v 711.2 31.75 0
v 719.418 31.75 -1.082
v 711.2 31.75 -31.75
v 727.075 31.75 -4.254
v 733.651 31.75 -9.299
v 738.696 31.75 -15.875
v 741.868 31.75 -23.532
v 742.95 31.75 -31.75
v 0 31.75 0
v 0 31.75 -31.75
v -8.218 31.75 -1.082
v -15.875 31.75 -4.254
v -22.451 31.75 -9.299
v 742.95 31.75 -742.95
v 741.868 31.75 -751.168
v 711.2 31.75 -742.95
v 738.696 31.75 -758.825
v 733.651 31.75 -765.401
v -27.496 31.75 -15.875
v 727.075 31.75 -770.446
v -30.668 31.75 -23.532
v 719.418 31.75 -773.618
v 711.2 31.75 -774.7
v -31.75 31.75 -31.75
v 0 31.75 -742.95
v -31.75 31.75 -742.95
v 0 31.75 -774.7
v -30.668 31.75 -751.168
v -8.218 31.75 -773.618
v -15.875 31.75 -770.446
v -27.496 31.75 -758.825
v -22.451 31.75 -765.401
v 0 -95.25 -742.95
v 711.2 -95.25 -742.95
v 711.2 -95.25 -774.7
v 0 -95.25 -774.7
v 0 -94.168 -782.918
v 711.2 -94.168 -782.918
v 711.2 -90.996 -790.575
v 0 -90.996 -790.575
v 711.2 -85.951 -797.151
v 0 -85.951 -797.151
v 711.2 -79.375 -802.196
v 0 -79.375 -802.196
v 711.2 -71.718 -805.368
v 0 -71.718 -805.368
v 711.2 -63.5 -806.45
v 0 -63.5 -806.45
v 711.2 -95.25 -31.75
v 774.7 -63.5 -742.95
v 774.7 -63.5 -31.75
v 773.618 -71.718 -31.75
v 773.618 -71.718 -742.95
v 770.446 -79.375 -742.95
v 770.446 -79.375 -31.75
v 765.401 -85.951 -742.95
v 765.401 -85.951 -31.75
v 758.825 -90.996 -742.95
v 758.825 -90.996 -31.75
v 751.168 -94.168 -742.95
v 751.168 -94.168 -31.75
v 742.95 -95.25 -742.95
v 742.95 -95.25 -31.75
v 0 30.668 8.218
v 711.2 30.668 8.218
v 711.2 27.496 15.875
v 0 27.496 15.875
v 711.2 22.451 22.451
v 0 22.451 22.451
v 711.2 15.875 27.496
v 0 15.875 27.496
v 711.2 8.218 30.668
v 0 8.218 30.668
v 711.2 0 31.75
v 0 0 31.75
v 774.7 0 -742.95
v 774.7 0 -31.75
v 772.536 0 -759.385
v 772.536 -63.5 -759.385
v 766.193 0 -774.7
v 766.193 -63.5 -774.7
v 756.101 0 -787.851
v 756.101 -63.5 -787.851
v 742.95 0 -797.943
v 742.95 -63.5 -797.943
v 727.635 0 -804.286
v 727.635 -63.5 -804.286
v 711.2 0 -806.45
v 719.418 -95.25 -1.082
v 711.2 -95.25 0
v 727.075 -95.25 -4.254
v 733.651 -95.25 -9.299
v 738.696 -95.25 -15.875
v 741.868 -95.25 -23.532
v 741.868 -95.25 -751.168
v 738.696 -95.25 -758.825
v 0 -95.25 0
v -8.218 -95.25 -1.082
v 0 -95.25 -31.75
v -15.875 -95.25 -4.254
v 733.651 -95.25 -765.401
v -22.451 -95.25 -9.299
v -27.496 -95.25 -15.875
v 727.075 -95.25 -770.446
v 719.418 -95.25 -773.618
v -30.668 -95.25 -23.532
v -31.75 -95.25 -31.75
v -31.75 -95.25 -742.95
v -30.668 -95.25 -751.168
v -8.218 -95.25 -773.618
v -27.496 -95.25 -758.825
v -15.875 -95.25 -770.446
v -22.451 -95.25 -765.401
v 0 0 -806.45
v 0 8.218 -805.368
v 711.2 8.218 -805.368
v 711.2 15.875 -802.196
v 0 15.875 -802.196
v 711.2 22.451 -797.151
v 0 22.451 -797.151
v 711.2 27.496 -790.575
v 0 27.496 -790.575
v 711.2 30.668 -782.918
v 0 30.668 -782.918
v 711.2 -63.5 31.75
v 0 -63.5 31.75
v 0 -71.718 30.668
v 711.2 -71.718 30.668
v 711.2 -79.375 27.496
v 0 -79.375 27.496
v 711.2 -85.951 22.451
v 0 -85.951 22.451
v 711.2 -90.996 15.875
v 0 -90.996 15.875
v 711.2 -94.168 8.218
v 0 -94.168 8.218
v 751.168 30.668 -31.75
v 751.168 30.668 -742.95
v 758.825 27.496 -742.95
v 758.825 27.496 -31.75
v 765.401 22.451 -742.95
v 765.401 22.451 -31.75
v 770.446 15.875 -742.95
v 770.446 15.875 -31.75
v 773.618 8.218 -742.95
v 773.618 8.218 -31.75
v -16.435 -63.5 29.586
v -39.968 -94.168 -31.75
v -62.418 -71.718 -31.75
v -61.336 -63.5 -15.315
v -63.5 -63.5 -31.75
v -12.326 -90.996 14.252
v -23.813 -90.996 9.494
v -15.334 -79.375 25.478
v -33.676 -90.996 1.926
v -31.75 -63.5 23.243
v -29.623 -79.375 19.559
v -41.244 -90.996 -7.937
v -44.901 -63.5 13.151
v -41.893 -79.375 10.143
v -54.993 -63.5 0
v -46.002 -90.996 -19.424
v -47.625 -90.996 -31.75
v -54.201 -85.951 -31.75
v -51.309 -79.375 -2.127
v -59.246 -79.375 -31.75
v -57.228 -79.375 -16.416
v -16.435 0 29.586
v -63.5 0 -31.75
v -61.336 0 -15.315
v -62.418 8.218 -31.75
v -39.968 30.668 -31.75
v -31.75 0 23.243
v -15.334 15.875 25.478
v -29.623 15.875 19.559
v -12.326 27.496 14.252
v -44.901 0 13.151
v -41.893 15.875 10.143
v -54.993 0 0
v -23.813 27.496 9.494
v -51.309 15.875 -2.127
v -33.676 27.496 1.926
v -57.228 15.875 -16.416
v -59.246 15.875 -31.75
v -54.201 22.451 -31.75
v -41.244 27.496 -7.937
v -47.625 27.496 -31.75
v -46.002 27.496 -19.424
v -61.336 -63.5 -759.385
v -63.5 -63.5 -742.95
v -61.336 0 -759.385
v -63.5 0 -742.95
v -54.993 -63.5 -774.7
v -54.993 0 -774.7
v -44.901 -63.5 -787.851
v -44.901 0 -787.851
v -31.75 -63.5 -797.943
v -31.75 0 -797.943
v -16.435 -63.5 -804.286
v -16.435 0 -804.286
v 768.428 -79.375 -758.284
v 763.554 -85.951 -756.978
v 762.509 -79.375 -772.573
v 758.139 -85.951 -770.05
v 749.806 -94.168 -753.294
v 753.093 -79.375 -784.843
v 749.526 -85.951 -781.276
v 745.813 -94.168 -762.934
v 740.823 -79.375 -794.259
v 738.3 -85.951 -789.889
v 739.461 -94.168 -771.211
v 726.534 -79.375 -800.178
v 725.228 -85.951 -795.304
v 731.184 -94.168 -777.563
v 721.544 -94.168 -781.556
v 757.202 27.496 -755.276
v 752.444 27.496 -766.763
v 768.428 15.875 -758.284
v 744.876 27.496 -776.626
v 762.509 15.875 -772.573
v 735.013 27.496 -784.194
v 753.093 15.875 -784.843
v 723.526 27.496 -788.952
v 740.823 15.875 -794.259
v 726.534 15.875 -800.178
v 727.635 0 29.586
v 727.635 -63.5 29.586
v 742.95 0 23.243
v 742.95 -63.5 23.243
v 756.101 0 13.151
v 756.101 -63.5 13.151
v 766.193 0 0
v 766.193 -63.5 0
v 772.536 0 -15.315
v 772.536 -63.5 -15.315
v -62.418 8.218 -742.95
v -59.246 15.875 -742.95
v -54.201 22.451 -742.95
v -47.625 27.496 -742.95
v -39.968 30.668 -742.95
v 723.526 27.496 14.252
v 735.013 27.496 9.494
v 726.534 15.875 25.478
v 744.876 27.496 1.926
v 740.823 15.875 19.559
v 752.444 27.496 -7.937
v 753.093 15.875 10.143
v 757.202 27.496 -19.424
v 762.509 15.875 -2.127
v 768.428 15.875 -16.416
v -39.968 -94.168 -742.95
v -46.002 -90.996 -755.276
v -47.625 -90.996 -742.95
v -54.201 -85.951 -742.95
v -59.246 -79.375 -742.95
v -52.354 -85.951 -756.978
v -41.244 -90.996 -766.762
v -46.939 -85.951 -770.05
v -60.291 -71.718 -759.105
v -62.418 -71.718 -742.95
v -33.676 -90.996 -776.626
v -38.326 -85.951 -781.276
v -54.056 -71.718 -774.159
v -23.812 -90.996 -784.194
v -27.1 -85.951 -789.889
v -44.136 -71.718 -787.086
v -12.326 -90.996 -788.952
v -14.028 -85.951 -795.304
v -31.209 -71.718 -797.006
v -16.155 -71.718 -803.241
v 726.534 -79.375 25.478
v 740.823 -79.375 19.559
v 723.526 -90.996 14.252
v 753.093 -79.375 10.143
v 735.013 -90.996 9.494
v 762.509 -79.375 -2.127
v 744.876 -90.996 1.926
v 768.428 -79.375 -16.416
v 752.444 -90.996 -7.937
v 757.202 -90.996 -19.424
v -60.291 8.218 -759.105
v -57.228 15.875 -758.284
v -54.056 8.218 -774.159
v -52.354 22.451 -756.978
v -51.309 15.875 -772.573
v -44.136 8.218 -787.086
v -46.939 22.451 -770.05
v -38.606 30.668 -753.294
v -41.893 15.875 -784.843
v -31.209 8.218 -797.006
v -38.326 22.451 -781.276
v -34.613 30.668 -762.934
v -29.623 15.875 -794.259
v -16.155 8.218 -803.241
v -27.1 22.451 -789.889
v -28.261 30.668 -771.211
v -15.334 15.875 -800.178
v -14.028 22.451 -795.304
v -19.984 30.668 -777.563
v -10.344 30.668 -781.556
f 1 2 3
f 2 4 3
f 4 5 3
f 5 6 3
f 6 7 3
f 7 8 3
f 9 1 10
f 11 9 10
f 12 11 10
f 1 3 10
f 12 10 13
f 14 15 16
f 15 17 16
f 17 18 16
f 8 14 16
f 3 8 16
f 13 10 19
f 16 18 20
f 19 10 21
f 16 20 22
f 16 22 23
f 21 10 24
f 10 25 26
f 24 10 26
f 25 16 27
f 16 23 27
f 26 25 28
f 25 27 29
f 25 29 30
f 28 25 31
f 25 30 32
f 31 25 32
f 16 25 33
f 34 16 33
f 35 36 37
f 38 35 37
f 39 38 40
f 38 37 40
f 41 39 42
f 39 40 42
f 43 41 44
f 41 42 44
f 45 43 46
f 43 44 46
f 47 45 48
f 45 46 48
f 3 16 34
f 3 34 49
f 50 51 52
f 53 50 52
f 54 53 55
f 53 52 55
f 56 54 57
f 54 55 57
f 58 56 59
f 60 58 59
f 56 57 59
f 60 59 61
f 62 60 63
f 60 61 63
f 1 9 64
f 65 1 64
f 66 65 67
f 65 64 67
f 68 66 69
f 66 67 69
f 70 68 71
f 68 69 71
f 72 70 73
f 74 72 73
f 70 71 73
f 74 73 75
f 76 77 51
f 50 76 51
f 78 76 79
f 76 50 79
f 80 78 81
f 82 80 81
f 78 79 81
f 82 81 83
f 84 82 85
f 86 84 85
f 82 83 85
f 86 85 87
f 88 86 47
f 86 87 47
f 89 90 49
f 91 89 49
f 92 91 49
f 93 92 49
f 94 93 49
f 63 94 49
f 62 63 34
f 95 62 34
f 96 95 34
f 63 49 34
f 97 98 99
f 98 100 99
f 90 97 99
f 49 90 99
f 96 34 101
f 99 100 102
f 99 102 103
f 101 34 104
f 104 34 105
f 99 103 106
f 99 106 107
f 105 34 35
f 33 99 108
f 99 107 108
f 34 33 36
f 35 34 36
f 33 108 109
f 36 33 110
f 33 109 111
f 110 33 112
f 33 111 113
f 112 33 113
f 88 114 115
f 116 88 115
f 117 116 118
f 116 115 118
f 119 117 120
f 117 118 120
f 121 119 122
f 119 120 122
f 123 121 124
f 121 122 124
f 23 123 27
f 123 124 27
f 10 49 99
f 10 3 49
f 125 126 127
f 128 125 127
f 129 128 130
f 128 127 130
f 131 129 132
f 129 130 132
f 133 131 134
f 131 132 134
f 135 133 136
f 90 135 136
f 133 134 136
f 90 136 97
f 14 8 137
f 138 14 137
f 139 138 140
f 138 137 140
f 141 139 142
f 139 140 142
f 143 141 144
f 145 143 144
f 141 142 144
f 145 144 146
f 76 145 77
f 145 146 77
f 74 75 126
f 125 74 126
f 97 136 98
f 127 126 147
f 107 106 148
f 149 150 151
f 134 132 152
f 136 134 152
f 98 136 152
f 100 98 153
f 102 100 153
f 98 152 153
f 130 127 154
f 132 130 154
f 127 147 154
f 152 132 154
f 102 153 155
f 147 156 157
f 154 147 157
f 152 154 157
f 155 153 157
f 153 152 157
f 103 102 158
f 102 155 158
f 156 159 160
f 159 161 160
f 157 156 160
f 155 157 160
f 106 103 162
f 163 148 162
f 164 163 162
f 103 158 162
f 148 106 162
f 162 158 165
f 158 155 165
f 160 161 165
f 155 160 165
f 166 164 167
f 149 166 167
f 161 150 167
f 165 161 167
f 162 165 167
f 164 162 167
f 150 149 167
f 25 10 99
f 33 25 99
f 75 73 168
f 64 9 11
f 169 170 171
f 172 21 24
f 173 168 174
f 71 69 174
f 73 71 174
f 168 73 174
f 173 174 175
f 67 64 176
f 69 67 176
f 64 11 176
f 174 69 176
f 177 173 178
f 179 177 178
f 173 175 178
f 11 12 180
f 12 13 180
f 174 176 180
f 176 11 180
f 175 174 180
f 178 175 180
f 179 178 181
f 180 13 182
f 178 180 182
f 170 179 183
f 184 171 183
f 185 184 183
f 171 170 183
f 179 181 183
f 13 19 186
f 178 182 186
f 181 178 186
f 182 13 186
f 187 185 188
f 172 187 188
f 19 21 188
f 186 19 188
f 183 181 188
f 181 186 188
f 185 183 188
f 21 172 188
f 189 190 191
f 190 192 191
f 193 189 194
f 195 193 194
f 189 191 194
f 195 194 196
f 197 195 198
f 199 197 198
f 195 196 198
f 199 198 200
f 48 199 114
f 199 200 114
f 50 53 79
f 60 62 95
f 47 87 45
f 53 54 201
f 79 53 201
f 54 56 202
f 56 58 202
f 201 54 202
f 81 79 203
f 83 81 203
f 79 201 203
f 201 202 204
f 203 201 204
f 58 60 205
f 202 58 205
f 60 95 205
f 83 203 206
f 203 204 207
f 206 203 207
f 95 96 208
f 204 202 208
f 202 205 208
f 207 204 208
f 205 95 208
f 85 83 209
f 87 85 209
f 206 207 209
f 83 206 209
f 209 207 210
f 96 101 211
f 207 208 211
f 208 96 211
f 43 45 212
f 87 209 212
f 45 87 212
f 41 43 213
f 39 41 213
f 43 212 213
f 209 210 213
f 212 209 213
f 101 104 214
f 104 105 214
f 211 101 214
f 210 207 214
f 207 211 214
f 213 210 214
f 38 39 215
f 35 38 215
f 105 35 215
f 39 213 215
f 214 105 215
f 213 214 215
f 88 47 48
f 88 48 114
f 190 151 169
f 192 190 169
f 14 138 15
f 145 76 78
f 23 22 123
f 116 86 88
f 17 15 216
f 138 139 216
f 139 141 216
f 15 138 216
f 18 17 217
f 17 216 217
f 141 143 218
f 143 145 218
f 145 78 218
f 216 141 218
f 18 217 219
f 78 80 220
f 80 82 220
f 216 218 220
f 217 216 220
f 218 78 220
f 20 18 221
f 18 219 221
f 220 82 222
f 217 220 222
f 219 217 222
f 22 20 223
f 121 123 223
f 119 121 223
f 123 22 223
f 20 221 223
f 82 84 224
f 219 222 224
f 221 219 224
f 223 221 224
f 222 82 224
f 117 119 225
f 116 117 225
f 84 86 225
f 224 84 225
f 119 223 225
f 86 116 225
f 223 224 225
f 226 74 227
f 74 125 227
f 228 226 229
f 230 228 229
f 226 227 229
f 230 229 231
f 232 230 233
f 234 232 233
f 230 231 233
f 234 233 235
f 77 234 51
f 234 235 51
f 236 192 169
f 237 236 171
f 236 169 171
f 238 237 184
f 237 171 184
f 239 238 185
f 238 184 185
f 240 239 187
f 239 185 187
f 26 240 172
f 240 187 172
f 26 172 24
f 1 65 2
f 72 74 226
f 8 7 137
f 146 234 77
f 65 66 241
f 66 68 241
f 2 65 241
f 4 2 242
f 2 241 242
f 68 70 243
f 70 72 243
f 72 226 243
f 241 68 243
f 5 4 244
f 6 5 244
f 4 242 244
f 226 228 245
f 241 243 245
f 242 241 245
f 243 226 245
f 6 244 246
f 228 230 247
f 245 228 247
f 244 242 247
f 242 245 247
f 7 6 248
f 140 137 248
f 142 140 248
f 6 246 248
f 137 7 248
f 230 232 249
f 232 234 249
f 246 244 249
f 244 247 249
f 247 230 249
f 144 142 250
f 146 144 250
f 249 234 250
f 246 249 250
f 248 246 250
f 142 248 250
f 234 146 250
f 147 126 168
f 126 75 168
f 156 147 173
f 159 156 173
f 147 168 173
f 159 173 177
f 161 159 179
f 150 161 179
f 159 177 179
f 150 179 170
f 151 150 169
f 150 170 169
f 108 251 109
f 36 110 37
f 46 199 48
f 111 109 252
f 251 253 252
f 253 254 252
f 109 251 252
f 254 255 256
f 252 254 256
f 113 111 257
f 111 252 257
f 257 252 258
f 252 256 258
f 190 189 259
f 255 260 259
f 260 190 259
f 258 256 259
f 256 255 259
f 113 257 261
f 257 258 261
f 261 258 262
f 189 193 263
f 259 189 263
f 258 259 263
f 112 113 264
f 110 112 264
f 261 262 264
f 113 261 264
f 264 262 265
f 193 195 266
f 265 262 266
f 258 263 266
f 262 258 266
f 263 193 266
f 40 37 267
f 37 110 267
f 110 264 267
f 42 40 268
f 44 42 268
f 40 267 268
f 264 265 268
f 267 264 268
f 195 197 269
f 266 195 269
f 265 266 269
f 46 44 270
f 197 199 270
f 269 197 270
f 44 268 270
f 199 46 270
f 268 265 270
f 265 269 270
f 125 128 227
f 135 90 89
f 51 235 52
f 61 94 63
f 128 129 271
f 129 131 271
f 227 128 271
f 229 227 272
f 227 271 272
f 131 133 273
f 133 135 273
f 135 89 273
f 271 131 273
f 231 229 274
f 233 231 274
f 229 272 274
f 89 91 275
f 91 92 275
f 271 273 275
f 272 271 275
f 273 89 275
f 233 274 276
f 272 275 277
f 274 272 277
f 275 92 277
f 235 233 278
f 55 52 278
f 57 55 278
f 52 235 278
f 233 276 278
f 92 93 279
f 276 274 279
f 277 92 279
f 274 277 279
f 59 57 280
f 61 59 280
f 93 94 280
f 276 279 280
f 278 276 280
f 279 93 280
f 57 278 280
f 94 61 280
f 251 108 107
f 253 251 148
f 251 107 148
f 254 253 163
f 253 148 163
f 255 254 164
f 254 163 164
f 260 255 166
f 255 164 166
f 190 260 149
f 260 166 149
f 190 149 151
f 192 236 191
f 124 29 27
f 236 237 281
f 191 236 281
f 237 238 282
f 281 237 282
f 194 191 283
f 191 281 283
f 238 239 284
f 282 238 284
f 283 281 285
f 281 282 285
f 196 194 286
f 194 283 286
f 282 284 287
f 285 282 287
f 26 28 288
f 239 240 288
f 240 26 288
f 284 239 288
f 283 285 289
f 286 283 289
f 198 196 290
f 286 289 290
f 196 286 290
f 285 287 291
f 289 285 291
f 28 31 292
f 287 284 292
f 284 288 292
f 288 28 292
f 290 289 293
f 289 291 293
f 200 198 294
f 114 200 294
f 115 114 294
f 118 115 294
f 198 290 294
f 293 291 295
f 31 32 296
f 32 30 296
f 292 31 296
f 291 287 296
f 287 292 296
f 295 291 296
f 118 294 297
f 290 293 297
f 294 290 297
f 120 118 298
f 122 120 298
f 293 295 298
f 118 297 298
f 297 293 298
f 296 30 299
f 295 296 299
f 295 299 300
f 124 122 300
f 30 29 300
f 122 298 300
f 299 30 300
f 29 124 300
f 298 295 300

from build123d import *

# Parameters (mm, degrees)
BOSS_EXTRUDE1_DEPTH = 711.2
REVOLVE13_ANGLE     = 90
REVOLVE12_ANGLE     = 90
BOSS_EXTRUDE3_DEPTH = 711.2
REVOLVE2_ANGLE      = 90
BOSS_EXTRUDE4_DEPTH = 711.2
REVOLVE10_ANGLE     = 90
BOSS_EXTRUDE5_DEPTH = 711.2


with BuildPart() as part:
    # Sketch1 → Boss-Extrude1 (new body)
    with BuildSketch(Plane(origin=(0, 0, 0), x_dir=(0, 0, -1), z_dir=(1, 0, 0))):
        with BuildLine():
            ThreePointArc((0, 31.75), (-22.450640303, 22.450640303), (-31.75, 0))
            Line((-31.75, 0), (-31.75, -63.5))
            ThreePointArc((-31.75, -63.5), (-22.450640303, -85.950640303), (0, -95.25))
            Line((0, -95.25), (31.75, -95.25))
            Line((31.75, -95.25), (31.75, 0))
            Line((31.75, 0), (31.75, 31.75))
            Line((31.75, 31.75), (0, 31.75))
        make_face()
    extrude(amount=BOSS_EXTRUDE1_DEPTH)



with BuildPart() as body_2:
    # Sketch8 → Revolve13 (revolve)
    with BuildSketch(Plane(origin=(711.2, 0, 0), x_dir=(0, 0, -1), z_dir=(1, 0, 0))):
        with BuildLine():
            Line((-31.75, 0), (-31.75, -63.5))
            ThreePointArc((-31.75, -63.5), (-22.450640303, -85.950640303), (0, -95.25))
            Line((0, -95.25), (31.75, -95.25))
            Line((31.75, -95.25), (31.75, 31.75))
            Line((31.75, 31.75), (0, 31.75))
            ThreePointArc((0, 31.75), (-22.450640303, 22.450640303), (-31.75, 0))
        make_face()
    revolve(axis=Axis((711.2, -95.25, -31.75), (0, 1, 0)), revolution_arc=REVOLVE13_ANGLE)


with BuildPart() as body_3:
    # Sketch15 → Revolve12 (revolve)
    with BuildSketch(Plane(origin=(0, 0, -31.75), x_dir=(0, 0, 1), z_dir=(-1, 0, 0))):
        with BuildLine():
            ThreePointArc((31.75, -95.25), (54.200640303, -85.950640303), (63.5, -63.5))
            Line((63.5, -63.5), (63.5, 0))
            ThreePointArc((63.5, 0), (54.200640303, 22.450640303), (31.75, 31.75))
            Line((31.75, 31.75), (0, 31.75))
            Line((0, 31.75), (0, -95.25))
            Line((0, -95.25), (31.75, -95.25))
        make_face()
    revolve(axis=Axis((0, 31.75, -31.75), (0, -1, 0)), revolution_arc=REVOLVE12_ANGLE)


with BuildPart() as part_1:
    add(part.part)

    add(body_2.part)  # Boss-Extrude3 merges body 2
    # Sketch7 → Boss-Extrude3 (add)
    with BuildSketch(Plane(origin=(0, 0, -31.75), x_dir=(-1, 0, 0), z_dir=(0, 0, -1))):
        with BuildLine():
            ThreePointArc((-742.95, 31.75), (-765.400640303, 22.450640303), (-774.7, 0))
            Line((-774.7, 0), (-774.7, -63.5))
            ThreePointArc((-774.7, -63.5), (-765.400640303, -85.950640303), (-742.95, -95.25))
            Line((-742.95, -95.25), (-711.2, -95.25))
            Line((-711.2, -95.25), (-711.2, 31.75))
            Line((-711.2, 31.75), (-742.95, 31.75))
        make_face()
    extrude(amount=BOSS_EXTRUDE3_DEPTH)

    # Sketch12 → Revolve2 (revolve)
    with BuildSketch(Plane(origin=(1454.15, 0, -742.95), x_dir=(-1, 0, 0), z_dir=(0, 0, -1))):
        with BuildLine():
            ThreePointArc((711.2, 31.75), (688.749359697, 22.450640303), (679.45, 0))
            Line((679.45, 0), (679.45, -63.5))
            ThreePointArc((679.45, -63.5), (688.749359697, -85.950640303), (711.2, -95.25))
            Line((711.2, -95.25), (742.95, -95.25))
            Line((742.95, -95.25), (742.95, 31.75))
            Line((742.95, 31.75), (711.2, 31.75))
        make_face()
    revolve(axis=Axis((711.2, -95.25, -742.95), (0, 1, 0)), revolution_arc=REVOLVE2_ANGLE)


    add(body_3.part)  # Boss-Extrude4 merges body 3
    # Sketch9 → Boss-Extrude4 (add)
    with BuildSketch(Plane(origin=(0, 0, -31.75), x_dir=(-1, 0, 0), z_dir=(0, 0, -1))):
        with BuildLine():
            Line((0, 31.75), (0, -95.25))
            Line((0, -95.25), (31.75, -95.25))
            ThreePointArc((31.75, -95.25), (54.200640303, -85.950640303), (63.5, -63.5))
            Line((63.5, -63.5), (63.5, 0))
            ThreePointArc((63.5, 0), (54.200640303, 22.450640303), (31.75, 31.75))
            Line((31.75, 31.75), (0, 31.75))
        make_face()
    extrude(amount=BOSS_EXTRUDE4_DEPTH)


with BuildPart() as body_2_2:
    # Sketch14 → Revolve10 (revolve)
    with BuildSketch(Plane(origin=(0, 0, -742.95), x_dir=(-1, 0, 0), z_dir=(0, 0, -1))):
        with BuildLine():
            Line((31.75, 31.75), (0, 31.75))
            Line((0, 31.75), (0, -95.25))
            Line((0, -95.25), (31.75, -95.25))
            ThreePointArc((31.75, -95.25), (54.200640303, -85.950640303), (63.5, -63.5))
            Line((63.5, -63.5), (63.5, 0))
            ThreePointArc((63.5, 0), (54.200640303, 22.450640303), (31.75, 31.75))
        make_face()
    revolve(axis=Axis((0, 31.75, -742.95), (0, -1, 0)), revolution_arc=REVOLVE10_ANGLE)


with BuildPart() as body_3_2:
    # Sketch10 → Boss-Extrude5 (new body)
    with BuildSketch(Plane(origin=(0, 0, 0), x_dir=(0, 0, -1), z_dir=(1, 0, 0))):
        with BuildLine():
            ThreePointArc((806.45, 0), (797.150640303, 22.450640303), (774.7, 31.75))
            Line((774.7, 31.75), (742.95, 31.75))
            Line((742.95, 31.75), (742.95, -95.25))
            Line((742.95, -95.25), (774.7, -95.25))
            ThreePointArc((774.7, -95.25), (797.150640303, -85.950640303), (806.45, -63.5))
            Line((806.45, -63.5), (806.45, 0))
        make_face()
    extrude(amount=BOSS_EXTRUDE5_DEPTH)


with BuildPart() as part_2:
    add(part_1.part)

    # Combine1: union body 3 2, body 2 2
    add(body_3_2.part)
    add(body_2_2.part)


solid = part_2.part
